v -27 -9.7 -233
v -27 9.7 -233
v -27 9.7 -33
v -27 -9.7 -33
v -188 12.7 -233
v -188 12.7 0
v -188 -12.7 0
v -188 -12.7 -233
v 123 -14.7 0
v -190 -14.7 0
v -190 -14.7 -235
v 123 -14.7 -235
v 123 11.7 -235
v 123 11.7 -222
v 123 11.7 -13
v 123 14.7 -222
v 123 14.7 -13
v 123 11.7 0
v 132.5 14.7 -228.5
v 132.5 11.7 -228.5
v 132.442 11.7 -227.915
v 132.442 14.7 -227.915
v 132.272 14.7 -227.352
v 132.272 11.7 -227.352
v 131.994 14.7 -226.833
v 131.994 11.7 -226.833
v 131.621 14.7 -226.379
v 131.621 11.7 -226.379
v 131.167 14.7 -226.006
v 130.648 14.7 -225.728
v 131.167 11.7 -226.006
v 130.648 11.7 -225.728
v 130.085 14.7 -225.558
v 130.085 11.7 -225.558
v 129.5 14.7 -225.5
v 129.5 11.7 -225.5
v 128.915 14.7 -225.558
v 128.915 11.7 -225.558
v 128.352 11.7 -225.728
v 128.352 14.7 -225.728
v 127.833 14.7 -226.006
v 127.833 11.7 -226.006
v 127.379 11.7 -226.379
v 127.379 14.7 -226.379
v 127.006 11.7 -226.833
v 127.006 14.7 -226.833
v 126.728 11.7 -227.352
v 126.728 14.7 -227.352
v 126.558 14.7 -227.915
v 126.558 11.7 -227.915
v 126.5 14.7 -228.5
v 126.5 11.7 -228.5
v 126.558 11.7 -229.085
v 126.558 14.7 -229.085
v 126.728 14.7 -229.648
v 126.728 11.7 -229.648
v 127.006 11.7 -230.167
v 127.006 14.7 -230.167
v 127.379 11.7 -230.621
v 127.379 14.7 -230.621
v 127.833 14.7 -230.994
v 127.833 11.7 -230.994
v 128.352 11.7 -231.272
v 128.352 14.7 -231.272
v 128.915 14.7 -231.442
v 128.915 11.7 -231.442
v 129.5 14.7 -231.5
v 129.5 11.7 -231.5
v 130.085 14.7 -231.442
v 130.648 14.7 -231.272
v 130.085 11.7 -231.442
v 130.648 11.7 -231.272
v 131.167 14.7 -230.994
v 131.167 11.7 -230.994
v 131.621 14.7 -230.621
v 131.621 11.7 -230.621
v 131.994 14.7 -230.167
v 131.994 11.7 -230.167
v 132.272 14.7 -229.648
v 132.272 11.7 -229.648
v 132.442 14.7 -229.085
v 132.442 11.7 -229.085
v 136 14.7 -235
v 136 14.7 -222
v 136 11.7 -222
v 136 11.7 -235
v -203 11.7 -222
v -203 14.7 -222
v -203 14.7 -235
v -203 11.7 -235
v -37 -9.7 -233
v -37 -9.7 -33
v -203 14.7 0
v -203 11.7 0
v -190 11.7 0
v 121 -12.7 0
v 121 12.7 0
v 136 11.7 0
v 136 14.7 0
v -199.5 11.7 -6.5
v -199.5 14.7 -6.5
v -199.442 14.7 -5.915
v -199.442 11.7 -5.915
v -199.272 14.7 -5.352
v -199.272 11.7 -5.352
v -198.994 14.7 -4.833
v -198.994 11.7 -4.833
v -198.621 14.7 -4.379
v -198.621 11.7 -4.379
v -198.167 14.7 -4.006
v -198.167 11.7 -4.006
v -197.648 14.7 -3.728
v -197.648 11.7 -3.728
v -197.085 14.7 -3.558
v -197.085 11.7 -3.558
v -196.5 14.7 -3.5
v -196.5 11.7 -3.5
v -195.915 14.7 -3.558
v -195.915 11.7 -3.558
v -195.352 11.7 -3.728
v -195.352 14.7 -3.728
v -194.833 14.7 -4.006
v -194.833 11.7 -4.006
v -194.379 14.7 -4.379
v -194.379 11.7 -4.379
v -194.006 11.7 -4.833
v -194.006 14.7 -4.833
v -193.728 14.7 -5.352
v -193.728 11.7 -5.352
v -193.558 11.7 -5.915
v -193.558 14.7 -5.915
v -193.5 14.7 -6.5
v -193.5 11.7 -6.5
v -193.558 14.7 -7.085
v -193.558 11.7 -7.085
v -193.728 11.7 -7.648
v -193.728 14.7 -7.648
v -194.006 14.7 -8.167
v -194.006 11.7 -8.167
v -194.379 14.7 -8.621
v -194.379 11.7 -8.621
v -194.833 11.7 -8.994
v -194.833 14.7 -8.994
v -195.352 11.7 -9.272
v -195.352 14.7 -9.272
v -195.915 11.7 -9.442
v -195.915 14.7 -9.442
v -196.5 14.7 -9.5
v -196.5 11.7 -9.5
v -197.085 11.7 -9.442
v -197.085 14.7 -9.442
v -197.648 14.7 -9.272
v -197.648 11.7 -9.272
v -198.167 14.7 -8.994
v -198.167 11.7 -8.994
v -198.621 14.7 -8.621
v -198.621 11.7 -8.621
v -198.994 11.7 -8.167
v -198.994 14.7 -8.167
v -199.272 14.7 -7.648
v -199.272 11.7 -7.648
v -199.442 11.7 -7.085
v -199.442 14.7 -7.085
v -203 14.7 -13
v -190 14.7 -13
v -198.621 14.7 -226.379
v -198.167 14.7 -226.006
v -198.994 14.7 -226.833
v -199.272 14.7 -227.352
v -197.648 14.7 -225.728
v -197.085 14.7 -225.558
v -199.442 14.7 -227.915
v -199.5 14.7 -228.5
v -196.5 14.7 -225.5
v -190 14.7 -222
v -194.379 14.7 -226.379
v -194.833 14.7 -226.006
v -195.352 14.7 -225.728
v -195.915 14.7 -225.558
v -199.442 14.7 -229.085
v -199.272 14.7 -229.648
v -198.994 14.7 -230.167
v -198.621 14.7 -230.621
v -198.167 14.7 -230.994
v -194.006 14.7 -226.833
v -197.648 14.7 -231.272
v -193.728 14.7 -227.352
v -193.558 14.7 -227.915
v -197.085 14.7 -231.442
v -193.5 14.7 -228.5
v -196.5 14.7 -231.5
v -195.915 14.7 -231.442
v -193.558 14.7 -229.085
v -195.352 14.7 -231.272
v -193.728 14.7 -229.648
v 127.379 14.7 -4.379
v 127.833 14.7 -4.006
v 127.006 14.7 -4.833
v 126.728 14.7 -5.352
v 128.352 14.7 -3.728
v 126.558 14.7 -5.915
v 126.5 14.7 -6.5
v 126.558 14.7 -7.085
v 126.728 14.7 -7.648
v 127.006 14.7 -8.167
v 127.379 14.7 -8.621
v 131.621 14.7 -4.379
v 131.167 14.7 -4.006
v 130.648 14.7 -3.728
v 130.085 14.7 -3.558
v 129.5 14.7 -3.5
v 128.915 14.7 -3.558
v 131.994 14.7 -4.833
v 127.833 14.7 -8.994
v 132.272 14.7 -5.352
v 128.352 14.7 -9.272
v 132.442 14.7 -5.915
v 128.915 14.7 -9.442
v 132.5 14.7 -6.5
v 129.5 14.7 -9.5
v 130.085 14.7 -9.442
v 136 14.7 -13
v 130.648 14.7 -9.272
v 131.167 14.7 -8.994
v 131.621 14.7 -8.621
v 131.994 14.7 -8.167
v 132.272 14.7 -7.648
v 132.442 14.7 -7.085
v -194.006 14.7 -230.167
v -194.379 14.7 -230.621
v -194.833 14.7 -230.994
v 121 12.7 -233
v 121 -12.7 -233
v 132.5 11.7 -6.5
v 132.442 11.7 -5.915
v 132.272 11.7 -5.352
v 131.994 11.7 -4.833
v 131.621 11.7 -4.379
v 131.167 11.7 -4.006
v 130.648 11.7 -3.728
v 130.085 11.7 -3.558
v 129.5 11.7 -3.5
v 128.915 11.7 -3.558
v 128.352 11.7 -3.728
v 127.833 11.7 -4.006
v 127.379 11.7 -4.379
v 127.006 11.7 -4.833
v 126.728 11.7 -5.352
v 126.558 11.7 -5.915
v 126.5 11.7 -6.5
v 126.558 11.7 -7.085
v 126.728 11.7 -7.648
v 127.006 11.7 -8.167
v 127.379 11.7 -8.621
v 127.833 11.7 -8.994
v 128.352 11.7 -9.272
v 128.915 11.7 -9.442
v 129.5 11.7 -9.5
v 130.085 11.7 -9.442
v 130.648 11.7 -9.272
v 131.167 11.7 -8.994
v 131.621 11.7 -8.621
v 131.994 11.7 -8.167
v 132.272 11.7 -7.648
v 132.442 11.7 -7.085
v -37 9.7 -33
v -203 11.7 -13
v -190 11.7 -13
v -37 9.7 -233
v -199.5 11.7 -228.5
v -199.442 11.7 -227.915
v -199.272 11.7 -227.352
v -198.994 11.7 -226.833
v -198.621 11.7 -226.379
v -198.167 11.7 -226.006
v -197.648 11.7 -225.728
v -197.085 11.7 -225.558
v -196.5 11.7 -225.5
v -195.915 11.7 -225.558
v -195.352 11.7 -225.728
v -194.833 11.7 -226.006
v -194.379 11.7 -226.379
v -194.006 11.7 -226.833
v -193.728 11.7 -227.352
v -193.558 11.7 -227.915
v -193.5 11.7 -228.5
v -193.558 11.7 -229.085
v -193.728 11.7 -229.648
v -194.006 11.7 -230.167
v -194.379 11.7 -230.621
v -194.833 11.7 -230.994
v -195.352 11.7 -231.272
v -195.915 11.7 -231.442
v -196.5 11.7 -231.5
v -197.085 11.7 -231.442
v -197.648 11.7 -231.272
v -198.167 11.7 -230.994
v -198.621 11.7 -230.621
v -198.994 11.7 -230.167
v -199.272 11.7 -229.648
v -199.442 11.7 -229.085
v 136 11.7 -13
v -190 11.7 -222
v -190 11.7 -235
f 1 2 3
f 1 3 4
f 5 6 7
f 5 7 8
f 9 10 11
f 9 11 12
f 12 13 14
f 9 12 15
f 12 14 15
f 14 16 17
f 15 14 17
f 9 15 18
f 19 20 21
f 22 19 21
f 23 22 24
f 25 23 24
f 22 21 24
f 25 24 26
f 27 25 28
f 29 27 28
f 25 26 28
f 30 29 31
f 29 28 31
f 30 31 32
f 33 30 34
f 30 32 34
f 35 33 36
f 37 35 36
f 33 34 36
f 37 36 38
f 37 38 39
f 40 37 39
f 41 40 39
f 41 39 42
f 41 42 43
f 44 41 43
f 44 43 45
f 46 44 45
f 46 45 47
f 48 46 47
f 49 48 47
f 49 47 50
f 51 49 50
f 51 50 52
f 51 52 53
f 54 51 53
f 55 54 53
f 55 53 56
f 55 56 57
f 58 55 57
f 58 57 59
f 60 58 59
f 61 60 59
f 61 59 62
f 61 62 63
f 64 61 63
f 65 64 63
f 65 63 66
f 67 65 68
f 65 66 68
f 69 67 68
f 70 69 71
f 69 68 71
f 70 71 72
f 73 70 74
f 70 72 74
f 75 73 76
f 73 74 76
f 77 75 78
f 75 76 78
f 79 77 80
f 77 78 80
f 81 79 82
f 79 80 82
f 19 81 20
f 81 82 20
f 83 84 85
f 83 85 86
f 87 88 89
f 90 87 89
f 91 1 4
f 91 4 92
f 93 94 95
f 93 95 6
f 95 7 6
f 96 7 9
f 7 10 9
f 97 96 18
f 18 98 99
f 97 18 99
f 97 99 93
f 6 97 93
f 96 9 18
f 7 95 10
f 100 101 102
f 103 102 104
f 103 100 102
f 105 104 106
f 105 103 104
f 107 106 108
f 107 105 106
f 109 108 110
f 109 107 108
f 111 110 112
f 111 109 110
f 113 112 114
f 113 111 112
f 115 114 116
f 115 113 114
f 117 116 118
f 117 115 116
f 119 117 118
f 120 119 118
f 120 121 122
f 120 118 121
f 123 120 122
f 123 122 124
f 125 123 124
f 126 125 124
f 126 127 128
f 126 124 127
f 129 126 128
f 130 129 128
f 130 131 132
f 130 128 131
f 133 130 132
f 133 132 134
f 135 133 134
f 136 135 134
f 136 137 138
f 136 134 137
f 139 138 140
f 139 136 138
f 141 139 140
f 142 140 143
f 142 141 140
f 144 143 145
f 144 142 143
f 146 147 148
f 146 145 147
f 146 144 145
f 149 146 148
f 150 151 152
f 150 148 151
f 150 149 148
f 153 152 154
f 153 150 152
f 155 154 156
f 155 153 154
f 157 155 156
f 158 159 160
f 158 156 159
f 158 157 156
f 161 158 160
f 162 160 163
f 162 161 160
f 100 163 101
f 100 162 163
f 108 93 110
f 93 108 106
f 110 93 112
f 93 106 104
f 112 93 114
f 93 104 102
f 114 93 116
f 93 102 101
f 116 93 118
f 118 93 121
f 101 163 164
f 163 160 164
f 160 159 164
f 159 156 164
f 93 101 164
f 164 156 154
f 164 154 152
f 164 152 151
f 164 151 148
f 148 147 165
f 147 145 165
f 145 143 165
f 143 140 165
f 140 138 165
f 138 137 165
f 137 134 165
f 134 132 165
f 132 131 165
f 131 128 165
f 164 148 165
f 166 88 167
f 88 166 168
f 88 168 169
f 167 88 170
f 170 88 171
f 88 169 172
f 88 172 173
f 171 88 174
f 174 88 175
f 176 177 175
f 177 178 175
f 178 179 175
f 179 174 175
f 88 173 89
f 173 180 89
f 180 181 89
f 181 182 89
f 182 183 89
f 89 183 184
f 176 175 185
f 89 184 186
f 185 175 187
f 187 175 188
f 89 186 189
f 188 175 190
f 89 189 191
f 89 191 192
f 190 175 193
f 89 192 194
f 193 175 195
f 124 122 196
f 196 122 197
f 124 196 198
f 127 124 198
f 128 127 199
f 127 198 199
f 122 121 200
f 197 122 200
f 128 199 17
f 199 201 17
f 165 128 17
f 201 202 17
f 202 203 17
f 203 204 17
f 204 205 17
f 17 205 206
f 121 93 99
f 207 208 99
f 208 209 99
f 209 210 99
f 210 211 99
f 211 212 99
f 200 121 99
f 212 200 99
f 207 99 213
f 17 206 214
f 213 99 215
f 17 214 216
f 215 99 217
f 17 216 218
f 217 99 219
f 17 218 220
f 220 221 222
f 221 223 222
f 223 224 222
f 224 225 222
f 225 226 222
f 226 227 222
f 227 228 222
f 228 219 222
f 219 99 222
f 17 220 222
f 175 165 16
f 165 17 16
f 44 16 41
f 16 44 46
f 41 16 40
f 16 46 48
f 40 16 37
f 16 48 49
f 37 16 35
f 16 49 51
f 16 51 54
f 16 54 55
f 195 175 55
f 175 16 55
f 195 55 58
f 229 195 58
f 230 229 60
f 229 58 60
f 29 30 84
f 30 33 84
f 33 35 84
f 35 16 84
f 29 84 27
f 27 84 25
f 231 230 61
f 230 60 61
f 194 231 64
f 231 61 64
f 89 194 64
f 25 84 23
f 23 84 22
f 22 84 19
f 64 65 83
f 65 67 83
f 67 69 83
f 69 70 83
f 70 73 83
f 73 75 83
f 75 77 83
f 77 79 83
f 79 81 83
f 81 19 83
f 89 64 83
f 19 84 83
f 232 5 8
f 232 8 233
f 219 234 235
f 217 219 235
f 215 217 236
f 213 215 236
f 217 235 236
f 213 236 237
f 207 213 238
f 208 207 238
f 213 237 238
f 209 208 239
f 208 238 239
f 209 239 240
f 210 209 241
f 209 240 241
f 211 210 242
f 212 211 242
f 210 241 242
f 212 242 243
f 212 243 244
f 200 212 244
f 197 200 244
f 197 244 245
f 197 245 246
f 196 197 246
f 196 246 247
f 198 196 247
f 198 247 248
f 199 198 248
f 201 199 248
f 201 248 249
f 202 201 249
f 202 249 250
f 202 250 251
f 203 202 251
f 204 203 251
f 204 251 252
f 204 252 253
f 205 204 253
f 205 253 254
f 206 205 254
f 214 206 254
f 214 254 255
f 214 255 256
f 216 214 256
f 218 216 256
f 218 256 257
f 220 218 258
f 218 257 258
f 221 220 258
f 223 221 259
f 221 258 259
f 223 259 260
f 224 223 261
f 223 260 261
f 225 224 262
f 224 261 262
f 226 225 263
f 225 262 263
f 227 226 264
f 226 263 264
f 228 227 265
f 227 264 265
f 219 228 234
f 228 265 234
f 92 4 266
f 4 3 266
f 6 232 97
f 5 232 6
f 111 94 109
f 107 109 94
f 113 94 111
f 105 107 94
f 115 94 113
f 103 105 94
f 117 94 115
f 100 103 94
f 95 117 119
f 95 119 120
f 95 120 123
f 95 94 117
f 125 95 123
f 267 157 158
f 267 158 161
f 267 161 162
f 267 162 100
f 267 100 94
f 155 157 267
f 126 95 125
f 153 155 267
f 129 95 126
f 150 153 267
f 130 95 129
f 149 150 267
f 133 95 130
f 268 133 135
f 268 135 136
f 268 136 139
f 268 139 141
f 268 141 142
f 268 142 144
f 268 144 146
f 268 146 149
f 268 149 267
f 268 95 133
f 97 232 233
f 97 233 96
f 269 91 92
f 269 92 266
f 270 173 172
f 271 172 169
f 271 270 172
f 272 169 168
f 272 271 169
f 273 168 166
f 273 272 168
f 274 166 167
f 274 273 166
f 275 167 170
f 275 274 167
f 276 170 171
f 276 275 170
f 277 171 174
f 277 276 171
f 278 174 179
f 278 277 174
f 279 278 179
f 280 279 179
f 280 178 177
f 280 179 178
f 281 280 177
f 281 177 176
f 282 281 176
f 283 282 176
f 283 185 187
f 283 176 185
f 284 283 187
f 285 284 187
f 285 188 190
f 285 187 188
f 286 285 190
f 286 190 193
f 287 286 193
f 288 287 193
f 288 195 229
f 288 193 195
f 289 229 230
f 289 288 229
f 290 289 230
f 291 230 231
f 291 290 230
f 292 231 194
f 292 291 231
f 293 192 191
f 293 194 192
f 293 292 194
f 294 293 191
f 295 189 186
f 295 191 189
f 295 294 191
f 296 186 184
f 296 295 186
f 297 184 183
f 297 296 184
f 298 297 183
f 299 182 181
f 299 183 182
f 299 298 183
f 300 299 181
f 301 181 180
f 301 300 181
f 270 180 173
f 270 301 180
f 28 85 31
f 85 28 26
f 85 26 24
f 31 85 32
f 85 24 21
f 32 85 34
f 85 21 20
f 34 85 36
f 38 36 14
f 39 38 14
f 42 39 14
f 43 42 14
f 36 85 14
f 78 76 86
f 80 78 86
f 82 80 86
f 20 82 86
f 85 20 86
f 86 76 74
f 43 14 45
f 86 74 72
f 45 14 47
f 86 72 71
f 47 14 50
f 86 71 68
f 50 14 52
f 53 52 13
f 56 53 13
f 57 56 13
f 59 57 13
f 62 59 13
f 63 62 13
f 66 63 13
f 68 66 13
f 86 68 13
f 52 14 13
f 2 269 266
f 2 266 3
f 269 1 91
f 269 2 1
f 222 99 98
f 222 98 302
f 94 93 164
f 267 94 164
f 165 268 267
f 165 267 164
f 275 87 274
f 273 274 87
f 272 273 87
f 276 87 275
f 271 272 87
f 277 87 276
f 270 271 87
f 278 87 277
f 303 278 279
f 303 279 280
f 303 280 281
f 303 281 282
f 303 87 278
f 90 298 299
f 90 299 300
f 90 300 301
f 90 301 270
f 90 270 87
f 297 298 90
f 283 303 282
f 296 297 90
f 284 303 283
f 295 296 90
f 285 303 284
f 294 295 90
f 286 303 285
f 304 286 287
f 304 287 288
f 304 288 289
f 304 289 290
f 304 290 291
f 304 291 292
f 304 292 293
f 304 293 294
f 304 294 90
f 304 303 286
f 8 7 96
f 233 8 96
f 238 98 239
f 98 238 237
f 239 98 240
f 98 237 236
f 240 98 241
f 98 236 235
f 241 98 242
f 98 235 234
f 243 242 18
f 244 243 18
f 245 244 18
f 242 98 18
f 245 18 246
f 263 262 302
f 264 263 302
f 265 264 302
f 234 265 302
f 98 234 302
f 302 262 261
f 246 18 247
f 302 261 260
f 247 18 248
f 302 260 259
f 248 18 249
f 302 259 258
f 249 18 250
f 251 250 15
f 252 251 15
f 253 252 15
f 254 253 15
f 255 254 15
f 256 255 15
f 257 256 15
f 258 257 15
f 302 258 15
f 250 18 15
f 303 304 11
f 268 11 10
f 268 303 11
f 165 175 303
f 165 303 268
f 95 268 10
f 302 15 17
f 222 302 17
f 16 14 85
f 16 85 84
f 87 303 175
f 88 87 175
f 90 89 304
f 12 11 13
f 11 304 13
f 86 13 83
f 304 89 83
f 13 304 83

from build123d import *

# Parameters (mm, degrees)
BOSS_EXTRUDE1_DEPTH  = 2
BOSS_EXTRUDE2_DEPTH  = 2
BOSS_EXTRUDE3_DEPTH  = 2
BOSS_EXTRUDE4_DEPTH  = 200
BOSS_EXTRUDE5_DEPTH  = 2
SKETCH7_W            = 313
SKETCH7_H            = 235
BOSS_EXTRUDE6_DEPTH  = 2
SKETCH8_W            = 13
SKETCH8_H            = 3
BOSS_EXTRUDE10_DEPTH = 13
SKETCH9_R            = 3
CUT_EXTRUDE1_DEPTH   = 10


with BuildPart() as part:
    # Sketch2 → Boss-Extrude1 (new body)
    with BuildSketch(Plane.ZY.offset(188)):
        Polygon((-59, 12.7), (-57, 12.7), (0, 12.7), (0, 8.2), (0, -8.2), (0, -12.7), (-57, -12.7), (-59, -12.7), (-233, -12.7), (-233, 0), (-233, 9.7), (-233, 12.7), align=None)
    extrude(amount=BOSS_EXTRUDE1_DEPTH)

    # Sketch3 → Boss-Extrude2 (add)
    with BuildSketch(Plane(origin=(0, 12.7, 0), x_dir=(1, 0, 0), z_dir=(0, 1, 0))):
        Polygon((-190, 233), (-188, 233), (121, 233), (121, 59), (121, 0), (111, 0), (-190, 0), align=None)
    extrude(amount=BOSS_EXTRUDE2_DEPTH)

    # Sketch4 → Boss-Extrude3 (add)
    with BuildSketch(Plane(origin=(0, 0, -233), x_dir=(-1, 0, 0), z_dir=(0, 0, -1))):
        Polygon((-121, 14.7), (190, 14.7), (190, -12.7), (-111, -12.7), (-121, -12.7), (-121, 12.7), align=None)
    extrude(amount=BOSS_EXTRUDE3_DEPTH)

    # Sketch6 → Boss-Extrude5 (add)
    with BuildSketch(Plane(origin=(121, 0, 0), x_dir=(0, 0, -1), z_dir=(1, 0, 0))):
        Polygon((235, 14.7), (235, -12.7), (0, -12.7), (0, 12.7), (0, 14.7), align=None)
    extrude(amount=BOSS_EXTRUDE5_DEPTH)

    # Sketch7 → Boss-Extrude6 (add)
    with BuildSketch(Plane.XZ.offset(12.7)):
        with Locations((-33.5, -117.5)):
            Rectangle(SKETCH7_W, SKETCH7_H)
    extrude(amount=BOSS_EXTRUDE6_DEPTH)

    # Sketch8 → Boss-Extrude10 (add)
    with BuildSketch(Plane(origin=(123, 0, 0), x_dir=(0, 0, -1), z_dir=(1, 0, 0))):
        with Locations((6.5, 13.2)):
            Rectangle(SKETCH8_W, SKETCH8_H)
        with Locations((228.5, 13.2)):
            Rectangle(SKETCH8_W, SKETCH8_H)
    boss_extrude10 = extrude(amount=BOSS_EXTRUDE10_DEPTH)

    # Mirror1: Boss-Extrude10 across plane
    add(boss_extrude10.mirror(Plane.ZY.offset(33.5)))

    # Sketch9 → Cut-Extrude1 (cut)
    with BuildSketch(Plane.XZ.offset(-11.7)):
        with Locations((129.5, -228.5)):
            Circle(SKETCH9_R)
        with Locations((129.5, -6.5)):
            Circle(SKETCH9_R)
    cut_extrude1 = extrude(amount=-CUT_EXTRUDE1_DEPTH, mode=Mode.SUBTRACT)

    # Mirror2: Cut-Extrude1 across plane
    add(cut_extrude1.mirror(Plane.ZY.offset(33.5)), mode=Mode.SUBTRACT)


with BuildPart() as body_2:
    # Sketch5 → Boss-Extrude4 (new body)
    with BuildSketch(Plane(origin=(0, 0, -233), x_dir=(-1, 0, 0), z_dir=(0, 0, -1))):
        Polygon((27, 0), (27, -9.7), (37, -9.7), (37, 0), (37, 9.7), (27, 9.7), align=None)
    extrude(amount=-BOSS_EXTRUDE4_DEPTH)


solid = Compound([part.part, body_2.part])
